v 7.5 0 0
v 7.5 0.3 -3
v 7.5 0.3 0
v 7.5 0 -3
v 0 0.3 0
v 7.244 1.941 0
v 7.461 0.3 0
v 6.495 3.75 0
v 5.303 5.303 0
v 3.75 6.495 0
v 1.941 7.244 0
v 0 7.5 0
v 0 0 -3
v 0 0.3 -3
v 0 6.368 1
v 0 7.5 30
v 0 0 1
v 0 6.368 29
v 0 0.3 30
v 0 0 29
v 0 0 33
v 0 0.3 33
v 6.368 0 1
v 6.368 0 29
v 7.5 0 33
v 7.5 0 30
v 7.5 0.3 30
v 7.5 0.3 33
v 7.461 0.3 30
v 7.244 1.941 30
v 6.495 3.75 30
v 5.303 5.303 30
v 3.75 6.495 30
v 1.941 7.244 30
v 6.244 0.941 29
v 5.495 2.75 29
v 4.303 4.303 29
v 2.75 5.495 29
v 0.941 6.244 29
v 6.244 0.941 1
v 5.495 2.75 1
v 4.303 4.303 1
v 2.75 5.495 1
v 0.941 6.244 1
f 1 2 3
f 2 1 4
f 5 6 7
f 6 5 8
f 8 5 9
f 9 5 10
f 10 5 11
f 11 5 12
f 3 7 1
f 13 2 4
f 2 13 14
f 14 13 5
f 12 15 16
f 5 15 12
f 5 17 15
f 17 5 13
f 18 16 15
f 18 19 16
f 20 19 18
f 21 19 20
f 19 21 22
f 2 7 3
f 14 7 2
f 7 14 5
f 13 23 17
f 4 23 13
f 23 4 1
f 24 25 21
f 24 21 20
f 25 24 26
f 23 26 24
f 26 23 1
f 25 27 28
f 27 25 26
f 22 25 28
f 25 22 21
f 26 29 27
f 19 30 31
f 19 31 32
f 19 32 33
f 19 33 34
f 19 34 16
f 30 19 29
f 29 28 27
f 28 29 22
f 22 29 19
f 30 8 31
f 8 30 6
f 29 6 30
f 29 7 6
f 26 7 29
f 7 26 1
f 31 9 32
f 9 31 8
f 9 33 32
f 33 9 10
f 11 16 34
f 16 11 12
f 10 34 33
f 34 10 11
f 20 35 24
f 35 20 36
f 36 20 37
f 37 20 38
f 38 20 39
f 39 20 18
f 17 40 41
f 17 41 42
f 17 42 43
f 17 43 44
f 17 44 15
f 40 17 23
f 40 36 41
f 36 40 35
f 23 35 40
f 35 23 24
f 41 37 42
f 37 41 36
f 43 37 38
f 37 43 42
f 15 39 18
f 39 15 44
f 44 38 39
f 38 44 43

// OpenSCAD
// Customizable Air Conditioner Baffle
// designed by knarfishness for DieselPoweredRobotics
// 07.04.2014

baffle_length = 30;
baffle_radius = 7.5;
baffle_thickness = 1;
baffle_endwall_thickness = 1;

baffle_bracket_size = 3;
baffle_bracket_thickness = 0.3;



module quarter_pipe()
{
	intersection()
	{
		cube([baffle_radius*2,baffle_radius*2,baffle_length]);
		cylinder(baffle_length,baffle_radius,baffle_radius);
	}
}

module quarter_pipe_inner()
{
	translate([0,0,baffle_endwall_thickness])
	intersection()
	{
		cube([baffle_radius*2,baffle_radius*2,baffle_length-(baffle_endwall_thickness*2)]);
		cylinder(baffle_length-(baffle_endwall_thickness*2),baffle_radius,baffle_radius);
	}
}

module baffle_wall()
{
	difference()
	{
		quarter_pipe();
		translate([-baffle_thickness,-baffle_thickness,0])
		quarter_pipe_inner();
		
	}
}

module bracket_piece()
{
	cube([baffle_radius,baffle_bracket_thickness,baffle_bracket_size]);
}

module brackets()
{
	translate([0,0,-baffle_bracket_size])
	bracket_piece();
	
	translate([0,0,baffle_length])
	bracket_piece();
}

brackets();
baffle_wall();
